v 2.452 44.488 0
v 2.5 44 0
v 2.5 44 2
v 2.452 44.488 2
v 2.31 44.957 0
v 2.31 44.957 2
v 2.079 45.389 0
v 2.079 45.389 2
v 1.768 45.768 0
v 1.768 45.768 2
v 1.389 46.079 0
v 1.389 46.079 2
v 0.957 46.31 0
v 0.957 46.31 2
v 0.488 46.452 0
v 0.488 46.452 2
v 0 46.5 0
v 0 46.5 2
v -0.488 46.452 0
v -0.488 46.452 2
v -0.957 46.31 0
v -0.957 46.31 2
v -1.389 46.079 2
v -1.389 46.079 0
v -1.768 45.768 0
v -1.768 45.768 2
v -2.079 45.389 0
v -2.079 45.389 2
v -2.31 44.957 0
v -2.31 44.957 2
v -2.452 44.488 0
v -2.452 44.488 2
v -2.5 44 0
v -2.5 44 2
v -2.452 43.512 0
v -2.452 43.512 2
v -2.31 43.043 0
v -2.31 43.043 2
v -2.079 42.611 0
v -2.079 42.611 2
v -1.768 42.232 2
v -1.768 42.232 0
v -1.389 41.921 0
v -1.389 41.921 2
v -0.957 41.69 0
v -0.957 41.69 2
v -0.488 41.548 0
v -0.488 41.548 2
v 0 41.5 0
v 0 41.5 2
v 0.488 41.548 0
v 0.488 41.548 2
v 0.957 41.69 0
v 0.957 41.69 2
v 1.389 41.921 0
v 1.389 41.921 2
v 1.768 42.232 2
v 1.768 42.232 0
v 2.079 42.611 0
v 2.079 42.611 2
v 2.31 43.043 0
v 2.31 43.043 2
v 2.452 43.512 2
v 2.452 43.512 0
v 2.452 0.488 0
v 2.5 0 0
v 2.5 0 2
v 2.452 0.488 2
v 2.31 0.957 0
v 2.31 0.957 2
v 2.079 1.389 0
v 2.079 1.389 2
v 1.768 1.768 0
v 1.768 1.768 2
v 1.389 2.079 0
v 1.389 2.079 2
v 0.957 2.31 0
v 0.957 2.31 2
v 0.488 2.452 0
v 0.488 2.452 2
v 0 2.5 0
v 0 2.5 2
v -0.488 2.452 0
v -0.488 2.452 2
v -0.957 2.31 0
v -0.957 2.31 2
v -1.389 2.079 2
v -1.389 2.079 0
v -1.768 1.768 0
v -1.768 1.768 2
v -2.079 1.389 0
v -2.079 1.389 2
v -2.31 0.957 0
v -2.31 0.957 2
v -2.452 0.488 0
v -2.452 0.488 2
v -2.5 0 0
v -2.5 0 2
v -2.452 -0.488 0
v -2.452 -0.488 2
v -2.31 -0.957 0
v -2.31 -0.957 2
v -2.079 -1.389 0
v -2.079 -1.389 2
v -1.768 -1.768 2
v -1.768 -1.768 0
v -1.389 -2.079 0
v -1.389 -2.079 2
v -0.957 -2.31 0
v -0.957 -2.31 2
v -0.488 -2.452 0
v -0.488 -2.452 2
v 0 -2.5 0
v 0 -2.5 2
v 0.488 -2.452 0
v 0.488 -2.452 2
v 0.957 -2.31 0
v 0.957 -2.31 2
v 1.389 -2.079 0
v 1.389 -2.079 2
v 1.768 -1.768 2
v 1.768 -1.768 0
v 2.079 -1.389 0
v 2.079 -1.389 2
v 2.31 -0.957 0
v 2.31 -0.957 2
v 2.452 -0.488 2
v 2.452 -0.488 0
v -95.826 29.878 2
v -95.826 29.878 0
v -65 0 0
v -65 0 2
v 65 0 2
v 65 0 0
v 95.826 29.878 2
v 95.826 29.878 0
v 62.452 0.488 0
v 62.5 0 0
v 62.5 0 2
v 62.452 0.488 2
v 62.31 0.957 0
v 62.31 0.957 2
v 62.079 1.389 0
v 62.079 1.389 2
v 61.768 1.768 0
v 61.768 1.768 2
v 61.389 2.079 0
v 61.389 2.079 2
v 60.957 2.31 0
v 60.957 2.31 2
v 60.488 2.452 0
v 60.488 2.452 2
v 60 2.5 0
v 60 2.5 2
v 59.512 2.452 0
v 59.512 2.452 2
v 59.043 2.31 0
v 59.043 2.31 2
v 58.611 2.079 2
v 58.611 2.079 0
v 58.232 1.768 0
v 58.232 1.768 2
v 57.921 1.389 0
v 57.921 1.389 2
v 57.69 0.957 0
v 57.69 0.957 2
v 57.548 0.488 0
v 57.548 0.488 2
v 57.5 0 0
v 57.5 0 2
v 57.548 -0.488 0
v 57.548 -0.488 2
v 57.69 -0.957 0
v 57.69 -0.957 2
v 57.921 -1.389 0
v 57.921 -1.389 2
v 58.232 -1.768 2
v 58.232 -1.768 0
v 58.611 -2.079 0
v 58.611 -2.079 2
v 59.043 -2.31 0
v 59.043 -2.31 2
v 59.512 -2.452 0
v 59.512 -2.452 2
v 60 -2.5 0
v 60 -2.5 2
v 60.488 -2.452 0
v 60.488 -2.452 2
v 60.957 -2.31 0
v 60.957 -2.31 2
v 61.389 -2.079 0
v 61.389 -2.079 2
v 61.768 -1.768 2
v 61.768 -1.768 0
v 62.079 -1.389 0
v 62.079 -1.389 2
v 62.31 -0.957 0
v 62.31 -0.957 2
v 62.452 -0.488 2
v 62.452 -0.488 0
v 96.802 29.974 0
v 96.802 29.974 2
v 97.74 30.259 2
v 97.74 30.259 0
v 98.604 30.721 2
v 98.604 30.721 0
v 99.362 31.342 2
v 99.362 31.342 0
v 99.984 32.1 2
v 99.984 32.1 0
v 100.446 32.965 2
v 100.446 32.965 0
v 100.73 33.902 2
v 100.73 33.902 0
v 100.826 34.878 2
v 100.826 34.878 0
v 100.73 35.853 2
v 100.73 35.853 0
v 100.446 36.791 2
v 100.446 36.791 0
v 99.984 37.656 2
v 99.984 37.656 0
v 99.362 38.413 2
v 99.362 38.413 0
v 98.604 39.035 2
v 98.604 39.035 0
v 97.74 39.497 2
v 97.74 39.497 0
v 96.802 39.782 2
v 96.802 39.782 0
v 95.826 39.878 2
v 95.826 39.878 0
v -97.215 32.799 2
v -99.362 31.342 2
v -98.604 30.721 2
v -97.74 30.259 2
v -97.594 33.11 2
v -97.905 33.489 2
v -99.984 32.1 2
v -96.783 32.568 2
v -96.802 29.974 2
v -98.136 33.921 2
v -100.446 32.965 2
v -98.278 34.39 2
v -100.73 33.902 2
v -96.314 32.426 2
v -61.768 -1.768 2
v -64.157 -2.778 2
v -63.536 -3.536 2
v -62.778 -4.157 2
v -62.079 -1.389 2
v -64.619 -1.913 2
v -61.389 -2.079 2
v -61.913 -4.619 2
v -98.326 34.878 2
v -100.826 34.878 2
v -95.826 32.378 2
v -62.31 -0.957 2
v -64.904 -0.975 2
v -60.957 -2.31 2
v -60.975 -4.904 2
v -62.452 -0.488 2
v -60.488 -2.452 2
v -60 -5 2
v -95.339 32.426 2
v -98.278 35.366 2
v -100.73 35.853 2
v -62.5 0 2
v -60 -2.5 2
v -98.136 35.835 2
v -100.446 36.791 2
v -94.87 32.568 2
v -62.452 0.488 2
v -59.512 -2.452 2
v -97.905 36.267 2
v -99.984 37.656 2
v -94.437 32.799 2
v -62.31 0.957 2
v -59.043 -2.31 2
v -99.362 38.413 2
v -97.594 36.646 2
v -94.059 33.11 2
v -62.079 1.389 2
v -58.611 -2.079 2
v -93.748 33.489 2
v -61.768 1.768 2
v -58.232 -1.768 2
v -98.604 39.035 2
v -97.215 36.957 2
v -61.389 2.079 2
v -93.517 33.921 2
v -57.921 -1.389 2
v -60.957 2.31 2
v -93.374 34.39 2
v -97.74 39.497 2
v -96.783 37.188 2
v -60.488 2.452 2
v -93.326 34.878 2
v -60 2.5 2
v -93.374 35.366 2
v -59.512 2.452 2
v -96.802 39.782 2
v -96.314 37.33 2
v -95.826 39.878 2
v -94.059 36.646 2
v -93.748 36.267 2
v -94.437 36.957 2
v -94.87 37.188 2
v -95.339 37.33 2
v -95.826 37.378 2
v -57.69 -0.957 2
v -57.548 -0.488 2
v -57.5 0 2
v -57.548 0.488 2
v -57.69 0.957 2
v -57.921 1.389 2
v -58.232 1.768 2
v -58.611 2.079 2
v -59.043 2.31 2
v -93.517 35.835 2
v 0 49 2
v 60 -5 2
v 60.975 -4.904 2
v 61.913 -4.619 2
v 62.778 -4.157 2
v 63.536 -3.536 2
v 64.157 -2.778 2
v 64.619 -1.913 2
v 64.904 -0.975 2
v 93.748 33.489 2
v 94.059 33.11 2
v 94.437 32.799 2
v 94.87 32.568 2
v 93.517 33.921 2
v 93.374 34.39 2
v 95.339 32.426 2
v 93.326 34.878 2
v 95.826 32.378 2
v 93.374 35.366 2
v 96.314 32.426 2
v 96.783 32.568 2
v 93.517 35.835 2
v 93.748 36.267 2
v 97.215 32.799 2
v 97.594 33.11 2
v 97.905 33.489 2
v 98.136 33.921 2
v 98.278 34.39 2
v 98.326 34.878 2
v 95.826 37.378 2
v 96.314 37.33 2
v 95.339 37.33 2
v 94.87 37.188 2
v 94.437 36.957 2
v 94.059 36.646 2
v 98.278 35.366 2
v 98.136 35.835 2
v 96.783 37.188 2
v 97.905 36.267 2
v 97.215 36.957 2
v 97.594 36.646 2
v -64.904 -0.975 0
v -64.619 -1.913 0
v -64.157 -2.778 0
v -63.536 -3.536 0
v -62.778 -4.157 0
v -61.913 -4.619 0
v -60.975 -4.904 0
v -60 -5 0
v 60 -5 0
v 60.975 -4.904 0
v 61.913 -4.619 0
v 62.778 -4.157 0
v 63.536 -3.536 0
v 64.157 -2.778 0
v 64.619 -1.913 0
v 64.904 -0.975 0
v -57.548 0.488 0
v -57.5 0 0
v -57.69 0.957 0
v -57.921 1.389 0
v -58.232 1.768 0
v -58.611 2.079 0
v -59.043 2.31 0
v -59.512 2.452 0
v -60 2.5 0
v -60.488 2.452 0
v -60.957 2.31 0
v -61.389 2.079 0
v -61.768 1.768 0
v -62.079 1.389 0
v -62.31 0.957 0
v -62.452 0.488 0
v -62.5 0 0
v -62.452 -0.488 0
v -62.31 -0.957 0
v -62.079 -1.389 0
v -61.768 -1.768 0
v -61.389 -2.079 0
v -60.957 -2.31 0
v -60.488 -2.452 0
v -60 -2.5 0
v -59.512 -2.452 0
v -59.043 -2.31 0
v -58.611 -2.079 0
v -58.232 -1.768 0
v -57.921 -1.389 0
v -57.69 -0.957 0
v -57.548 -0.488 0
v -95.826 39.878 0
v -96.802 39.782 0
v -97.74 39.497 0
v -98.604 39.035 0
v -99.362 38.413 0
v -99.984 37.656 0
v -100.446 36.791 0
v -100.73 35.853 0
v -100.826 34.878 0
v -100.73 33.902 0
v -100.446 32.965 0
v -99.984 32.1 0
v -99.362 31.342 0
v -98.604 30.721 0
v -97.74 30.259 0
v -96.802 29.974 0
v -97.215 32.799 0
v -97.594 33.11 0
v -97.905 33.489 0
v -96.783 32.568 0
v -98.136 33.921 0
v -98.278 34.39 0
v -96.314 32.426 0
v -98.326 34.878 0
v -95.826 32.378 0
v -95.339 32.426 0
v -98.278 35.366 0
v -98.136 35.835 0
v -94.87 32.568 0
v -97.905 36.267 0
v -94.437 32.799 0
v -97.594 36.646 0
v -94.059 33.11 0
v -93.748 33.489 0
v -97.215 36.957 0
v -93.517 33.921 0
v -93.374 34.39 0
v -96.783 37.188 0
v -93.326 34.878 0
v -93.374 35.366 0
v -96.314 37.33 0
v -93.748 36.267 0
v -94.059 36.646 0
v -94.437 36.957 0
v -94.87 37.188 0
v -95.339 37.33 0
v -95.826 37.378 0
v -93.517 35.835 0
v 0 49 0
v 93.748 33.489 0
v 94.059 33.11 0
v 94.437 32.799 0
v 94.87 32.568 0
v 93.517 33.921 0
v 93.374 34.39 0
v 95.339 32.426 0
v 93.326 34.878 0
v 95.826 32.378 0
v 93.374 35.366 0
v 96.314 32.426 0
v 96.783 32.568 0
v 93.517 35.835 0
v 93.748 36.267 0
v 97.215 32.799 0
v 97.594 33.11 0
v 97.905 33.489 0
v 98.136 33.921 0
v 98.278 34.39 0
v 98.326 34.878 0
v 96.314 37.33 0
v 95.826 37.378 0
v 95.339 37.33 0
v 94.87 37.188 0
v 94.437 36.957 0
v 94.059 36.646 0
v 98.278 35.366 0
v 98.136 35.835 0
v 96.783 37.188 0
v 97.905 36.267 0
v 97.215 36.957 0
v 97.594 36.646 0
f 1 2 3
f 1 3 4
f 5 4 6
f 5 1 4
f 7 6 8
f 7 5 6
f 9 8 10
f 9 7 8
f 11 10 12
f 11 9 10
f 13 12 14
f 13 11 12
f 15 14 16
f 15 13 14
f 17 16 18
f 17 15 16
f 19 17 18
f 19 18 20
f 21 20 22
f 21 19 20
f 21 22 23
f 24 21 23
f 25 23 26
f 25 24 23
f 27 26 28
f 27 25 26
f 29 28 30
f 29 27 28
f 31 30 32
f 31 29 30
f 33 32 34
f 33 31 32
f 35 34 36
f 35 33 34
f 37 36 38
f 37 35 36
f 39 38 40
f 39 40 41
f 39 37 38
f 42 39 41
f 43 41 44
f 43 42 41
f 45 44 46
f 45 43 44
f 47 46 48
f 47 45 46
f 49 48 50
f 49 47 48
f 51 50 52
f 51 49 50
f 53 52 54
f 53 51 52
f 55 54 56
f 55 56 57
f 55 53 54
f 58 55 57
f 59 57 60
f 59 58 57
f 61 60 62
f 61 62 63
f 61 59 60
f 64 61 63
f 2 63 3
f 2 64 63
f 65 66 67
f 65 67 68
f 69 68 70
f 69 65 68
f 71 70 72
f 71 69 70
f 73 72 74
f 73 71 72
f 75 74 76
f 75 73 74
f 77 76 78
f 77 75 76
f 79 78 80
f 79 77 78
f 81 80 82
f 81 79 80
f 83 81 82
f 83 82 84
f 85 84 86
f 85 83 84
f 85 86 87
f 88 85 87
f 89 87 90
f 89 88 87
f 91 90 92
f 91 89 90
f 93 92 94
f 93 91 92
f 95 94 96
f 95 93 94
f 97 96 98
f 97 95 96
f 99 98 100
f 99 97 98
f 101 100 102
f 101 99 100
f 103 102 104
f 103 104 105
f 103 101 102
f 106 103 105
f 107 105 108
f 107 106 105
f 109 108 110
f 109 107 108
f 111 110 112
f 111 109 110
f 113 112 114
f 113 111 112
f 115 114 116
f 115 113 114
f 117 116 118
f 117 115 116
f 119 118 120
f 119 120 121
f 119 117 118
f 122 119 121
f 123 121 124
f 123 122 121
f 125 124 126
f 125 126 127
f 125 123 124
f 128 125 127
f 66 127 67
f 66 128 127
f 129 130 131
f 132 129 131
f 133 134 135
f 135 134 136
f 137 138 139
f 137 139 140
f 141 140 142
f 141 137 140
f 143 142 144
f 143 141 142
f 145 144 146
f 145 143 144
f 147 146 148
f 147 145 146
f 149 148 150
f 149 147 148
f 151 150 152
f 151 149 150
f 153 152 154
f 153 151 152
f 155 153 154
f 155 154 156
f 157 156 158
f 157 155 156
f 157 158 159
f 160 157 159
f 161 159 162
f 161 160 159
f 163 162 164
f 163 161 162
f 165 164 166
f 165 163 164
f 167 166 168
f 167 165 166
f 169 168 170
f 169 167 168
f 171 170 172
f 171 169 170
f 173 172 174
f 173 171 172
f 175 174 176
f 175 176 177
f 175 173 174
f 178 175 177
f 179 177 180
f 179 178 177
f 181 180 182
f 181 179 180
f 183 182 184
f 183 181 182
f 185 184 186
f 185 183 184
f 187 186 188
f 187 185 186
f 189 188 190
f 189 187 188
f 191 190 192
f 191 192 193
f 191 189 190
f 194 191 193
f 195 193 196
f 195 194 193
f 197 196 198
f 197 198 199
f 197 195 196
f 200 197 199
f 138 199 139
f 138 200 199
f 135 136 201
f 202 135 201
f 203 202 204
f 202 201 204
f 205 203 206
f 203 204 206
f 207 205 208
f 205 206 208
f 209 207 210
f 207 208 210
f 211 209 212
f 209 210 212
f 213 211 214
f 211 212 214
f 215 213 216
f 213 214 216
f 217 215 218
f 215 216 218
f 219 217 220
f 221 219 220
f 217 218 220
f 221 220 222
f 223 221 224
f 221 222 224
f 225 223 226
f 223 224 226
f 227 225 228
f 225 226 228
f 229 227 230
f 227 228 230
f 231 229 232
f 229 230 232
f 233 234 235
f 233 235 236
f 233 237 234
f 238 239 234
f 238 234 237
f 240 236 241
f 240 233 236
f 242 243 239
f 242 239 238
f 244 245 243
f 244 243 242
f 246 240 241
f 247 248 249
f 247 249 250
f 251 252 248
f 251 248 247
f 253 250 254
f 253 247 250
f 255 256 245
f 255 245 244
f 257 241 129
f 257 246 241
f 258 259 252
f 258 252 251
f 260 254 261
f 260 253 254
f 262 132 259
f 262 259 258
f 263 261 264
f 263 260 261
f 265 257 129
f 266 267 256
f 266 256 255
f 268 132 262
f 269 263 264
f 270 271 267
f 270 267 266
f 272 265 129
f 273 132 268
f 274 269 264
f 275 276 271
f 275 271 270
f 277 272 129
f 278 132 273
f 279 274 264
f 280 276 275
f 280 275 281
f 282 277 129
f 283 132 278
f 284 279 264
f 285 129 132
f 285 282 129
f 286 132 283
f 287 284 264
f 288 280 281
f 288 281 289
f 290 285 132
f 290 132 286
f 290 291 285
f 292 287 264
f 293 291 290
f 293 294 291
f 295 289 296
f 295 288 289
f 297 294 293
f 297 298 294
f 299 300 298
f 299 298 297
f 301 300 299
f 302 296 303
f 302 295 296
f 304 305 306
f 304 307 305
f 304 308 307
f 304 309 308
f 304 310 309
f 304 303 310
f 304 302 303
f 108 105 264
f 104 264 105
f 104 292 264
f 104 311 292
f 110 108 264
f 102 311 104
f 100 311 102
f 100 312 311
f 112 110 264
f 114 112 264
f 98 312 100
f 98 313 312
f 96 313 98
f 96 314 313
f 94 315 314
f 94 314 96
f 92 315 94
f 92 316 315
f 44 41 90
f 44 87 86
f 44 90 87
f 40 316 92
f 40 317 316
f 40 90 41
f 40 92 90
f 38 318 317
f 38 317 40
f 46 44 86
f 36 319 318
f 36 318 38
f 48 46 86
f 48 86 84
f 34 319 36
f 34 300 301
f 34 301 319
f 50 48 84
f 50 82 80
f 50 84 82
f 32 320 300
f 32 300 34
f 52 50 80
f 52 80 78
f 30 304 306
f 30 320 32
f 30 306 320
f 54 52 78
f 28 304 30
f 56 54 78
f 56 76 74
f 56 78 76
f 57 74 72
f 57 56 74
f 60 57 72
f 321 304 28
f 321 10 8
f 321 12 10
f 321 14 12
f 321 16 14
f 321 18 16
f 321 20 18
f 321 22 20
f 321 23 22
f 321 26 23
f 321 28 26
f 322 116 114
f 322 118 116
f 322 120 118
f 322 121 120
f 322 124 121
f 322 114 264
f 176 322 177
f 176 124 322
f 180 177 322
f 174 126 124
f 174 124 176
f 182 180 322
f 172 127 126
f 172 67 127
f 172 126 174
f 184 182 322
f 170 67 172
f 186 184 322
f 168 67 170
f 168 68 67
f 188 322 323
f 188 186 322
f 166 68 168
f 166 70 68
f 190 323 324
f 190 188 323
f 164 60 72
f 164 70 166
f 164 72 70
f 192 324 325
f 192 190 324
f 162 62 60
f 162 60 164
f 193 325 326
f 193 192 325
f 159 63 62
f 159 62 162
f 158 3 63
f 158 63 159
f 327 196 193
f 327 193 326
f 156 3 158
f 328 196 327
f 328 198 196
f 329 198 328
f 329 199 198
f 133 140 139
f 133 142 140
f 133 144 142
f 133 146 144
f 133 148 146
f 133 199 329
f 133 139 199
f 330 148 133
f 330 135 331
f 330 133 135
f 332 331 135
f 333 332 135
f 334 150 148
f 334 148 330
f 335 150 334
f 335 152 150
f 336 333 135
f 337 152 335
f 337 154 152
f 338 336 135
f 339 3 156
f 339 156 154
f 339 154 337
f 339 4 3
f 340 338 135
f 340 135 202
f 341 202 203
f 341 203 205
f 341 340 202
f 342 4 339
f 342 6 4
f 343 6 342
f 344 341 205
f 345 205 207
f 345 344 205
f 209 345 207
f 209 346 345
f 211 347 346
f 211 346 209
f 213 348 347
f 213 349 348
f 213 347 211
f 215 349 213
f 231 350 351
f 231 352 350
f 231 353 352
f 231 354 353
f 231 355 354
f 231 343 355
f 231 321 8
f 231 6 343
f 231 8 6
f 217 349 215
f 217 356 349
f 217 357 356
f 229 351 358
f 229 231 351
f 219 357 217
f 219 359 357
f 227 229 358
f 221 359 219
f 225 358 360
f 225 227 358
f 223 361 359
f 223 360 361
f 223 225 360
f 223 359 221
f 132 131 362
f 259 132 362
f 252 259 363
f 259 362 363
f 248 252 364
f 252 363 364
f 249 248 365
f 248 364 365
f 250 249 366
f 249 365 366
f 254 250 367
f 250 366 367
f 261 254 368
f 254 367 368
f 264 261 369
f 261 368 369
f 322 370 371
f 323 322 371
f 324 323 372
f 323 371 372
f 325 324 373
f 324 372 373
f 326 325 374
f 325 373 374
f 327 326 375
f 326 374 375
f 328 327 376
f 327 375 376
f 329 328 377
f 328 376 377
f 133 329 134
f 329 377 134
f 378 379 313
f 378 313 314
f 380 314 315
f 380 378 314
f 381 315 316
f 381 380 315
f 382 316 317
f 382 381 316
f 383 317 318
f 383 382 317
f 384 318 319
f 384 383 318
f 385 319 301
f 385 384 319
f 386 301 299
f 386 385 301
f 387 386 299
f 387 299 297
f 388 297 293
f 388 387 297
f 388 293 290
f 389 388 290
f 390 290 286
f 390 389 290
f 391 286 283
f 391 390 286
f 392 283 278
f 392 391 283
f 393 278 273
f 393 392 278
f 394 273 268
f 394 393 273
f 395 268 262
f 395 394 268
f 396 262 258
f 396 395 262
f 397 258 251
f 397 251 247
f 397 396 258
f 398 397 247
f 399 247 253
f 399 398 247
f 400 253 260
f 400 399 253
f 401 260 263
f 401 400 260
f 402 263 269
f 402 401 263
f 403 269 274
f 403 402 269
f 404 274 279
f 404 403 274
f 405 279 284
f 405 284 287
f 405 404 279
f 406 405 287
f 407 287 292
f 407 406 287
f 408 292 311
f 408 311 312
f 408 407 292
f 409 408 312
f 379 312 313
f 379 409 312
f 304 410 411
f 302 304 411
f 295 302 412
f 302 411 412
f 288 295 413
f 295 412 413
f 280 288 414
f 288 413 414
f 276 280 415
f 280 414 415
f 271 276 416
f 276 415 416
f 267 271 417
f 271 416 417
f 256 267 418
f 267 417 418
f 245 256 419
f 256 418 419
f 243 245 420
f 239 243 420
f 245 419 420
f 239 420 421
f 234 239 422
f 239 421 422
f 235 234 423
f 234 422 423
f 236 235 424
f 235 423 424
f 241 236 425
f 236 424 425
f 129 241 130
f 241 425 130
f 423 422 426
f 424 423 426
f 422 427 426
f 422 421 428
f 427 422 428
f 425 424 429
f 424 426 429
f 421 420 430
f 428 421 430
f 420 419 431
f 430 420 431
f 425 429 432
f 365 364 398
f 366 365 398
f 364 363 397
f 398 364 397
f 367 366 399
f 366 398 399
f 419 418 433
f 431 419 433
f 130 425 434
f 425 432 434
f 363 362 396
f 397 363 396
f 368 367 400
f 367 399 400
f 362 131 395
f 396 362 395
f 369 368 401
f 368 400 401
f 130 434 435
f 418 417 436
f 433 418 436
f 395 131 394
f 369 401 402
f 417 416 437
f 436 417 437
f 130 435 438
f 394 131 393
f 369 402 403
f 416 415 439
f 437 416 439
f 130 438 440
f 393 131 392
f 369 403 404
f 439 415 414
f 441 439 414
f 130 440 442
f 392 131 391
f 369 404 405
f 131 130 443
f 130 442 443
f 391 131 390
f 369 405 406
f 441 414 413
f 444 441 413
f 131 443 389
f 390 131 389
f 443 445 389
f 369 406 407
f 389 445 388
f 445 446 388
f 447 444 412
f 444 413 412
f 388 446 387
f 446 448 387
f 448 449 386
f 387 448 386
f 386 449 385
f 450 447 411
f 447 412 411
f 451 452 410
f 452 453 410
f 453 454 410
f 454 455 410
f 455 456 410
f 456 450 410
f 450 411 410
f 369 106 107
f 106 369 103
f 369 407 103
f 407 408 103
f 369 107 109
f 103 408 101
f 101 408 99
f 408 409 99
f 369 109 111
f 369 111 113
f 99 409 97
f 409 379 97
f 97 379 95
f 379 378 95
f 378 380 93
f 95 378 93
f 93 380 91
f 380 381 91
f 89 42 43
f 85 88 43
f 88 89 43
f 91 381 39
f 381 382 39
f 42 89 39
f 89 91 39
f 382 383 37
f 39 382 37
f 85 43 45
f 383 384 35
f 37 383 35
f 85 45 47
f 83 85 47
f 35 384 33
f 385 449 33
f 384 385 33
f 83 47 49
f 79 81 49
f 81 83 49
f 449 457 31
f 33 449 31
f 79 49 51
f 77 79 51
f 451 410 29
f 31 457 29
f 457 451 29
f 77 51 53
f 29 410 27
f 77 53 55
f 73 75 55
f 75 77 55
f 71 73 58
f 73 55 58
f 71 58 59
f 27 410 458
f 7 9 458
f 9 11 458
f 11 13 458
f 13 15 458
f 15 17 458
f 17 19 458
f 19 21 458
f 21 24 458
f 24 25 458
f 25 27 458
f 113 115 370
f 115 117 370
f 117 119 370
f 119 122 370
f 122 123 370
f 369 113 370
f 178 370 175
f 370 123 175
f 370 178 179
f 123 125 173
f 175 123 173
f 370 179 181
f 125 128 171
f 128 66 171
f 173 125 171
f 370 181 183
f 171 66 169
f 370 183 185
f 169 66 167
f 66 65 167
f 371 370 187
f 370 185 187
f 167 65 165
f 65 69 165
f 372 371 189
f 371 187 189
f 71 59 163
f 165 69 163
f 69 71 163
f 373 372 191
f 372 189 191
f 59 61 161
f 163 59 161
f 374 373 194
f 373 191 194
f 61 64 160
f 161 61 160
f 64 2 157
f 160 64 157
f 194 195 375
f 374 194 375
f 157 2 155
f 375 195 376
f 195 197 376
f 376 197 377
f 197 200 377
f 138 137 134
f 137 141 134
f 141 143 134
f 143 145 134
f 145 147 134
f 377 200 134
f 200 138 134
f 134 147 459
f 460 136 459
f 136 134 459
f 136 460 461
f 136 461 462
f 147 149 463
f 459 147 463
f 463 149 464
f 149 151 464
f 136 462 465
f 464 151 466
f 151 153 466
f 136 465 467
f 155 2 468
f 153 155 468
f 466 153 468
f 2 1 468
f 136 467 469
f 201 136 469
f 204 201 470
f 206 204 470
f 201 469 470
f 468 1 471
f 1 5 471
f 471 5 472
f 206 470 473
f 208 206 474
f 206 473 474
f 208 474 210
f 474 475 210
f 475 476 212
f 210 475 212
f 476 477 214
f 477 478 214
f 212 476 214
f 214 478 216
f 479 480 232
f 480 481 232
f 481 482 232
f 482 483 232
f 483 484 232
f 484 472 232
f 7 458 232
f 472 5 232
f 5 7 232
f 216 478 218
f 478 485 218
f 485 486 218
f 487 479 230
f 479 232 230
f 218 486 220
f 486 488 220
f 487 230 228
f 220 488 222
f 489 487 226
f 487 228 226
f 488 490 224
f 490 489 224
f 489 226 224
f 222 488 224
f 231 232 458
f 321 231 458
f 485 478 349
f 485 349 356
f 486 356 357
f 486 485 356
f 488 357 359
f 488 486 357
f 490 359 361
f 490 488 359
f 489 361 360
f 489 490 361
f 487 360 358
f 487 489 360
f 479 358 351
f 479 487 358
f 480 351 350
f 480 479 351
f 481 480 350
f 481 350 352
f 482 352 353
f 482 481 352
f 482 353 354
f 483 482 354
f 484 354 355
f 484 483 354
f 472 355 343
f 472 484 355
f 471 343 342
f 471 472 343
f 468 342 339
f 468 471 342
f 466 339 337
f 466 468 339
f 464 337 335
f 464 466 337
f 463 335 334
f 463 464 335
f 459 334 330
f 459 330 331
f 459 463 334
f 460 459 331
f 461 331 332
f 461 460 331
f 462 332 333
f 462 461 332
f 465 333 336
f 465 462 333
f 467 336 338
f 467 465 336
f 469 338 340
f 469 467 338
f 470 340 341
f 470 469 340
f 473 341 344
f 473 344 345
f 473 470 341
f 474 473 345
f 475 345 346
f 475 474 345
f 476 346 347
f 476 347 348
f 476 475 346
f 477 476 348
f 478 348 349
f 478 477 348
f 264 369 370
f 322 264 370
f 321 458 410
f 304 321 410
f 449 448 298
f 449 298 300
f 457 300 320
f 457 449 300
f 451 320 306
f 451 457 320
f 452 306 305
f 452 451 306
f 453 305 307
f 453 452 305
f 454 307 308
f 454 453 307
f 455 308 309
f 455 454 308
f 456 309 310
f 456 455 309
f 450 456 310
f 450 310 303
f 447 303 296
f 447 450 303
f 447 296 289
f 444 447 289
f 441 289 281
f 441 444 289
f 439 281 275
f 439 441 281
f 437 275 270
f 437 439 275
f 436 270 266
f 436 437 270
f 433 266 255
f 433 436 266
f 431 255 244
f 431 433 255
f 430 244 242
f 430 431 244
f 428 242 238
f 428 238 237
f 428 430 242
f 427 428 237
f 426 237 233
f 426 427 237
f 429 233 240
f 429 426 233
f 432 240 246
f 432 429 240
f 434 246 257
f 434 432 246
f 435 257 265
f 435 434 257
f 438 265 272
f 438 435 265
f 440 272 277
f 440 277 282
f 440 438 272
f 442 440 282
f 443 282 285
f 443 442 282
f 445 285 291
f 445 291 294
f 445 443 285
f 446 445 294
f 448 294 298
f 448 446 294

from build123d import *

# Parameters (mm, degrees)
SKETCH1_R           = 2.5
BOSS_EXTRUDE1_DEPTH = 2


with BuildPart() as part:
    # Sketch1 → Boss-Extrude1 (new body)
    with BuildSketch(Plane.XY):
        with BuildLine():
            ThreePointArc((-95.826370741, 39.877946607), (-100.826370741, 34.877946607), (-95.826370741, 29.877946607))
            Line((-95.826370741, 29.877946607), (-65, 0))
            ThreePointArc((-65, 0), (-63.535533906, -3.535533906), (-60, -5))
            Line((-60, -5), (60, -5))
            ThreePointArc((60, -5), (63.535533906, -3.535533906), (65, 0))
            Line((65, 0), (95.826370741, 29.877946607))
            ThreePointArc((95.826370741, 29.877946607), (100.826370741, 34.877946607), (95.826370741, 39.877946607))
            Line((95.826370741, 39.877946607), (0, 49))
            Line((0, 49), (-95.826370741, 39.877946607))
        make_face()
        Circle(SKETCH1_R, mode=Mode.SUBTRACT)
        with Locations((-95.826370741, 34.877946607)):
            Circle(SKETCH1_R, mode=Mode.SUBTRACT)
        with Locations((0, 44)):
            Circle(SKETCH1_R, mode=Mode.SUBTRACT)
        with Locations((-60, 0)):
            Circle(SKETCH1_R, mode=Mode.SUBTRACT)
        with Locations((95.826370741, 34.877946607)):
            Circle(SKETCH1_R, mode=Mode.SUBTRACT)
        with Locations((60, 0)):
            Circle(SKETCH1_R, mode=Mode.SUBTRACT)
    extrude(amount=BOSS_EXTRUDE1_DEPTH)


solid = part.part
